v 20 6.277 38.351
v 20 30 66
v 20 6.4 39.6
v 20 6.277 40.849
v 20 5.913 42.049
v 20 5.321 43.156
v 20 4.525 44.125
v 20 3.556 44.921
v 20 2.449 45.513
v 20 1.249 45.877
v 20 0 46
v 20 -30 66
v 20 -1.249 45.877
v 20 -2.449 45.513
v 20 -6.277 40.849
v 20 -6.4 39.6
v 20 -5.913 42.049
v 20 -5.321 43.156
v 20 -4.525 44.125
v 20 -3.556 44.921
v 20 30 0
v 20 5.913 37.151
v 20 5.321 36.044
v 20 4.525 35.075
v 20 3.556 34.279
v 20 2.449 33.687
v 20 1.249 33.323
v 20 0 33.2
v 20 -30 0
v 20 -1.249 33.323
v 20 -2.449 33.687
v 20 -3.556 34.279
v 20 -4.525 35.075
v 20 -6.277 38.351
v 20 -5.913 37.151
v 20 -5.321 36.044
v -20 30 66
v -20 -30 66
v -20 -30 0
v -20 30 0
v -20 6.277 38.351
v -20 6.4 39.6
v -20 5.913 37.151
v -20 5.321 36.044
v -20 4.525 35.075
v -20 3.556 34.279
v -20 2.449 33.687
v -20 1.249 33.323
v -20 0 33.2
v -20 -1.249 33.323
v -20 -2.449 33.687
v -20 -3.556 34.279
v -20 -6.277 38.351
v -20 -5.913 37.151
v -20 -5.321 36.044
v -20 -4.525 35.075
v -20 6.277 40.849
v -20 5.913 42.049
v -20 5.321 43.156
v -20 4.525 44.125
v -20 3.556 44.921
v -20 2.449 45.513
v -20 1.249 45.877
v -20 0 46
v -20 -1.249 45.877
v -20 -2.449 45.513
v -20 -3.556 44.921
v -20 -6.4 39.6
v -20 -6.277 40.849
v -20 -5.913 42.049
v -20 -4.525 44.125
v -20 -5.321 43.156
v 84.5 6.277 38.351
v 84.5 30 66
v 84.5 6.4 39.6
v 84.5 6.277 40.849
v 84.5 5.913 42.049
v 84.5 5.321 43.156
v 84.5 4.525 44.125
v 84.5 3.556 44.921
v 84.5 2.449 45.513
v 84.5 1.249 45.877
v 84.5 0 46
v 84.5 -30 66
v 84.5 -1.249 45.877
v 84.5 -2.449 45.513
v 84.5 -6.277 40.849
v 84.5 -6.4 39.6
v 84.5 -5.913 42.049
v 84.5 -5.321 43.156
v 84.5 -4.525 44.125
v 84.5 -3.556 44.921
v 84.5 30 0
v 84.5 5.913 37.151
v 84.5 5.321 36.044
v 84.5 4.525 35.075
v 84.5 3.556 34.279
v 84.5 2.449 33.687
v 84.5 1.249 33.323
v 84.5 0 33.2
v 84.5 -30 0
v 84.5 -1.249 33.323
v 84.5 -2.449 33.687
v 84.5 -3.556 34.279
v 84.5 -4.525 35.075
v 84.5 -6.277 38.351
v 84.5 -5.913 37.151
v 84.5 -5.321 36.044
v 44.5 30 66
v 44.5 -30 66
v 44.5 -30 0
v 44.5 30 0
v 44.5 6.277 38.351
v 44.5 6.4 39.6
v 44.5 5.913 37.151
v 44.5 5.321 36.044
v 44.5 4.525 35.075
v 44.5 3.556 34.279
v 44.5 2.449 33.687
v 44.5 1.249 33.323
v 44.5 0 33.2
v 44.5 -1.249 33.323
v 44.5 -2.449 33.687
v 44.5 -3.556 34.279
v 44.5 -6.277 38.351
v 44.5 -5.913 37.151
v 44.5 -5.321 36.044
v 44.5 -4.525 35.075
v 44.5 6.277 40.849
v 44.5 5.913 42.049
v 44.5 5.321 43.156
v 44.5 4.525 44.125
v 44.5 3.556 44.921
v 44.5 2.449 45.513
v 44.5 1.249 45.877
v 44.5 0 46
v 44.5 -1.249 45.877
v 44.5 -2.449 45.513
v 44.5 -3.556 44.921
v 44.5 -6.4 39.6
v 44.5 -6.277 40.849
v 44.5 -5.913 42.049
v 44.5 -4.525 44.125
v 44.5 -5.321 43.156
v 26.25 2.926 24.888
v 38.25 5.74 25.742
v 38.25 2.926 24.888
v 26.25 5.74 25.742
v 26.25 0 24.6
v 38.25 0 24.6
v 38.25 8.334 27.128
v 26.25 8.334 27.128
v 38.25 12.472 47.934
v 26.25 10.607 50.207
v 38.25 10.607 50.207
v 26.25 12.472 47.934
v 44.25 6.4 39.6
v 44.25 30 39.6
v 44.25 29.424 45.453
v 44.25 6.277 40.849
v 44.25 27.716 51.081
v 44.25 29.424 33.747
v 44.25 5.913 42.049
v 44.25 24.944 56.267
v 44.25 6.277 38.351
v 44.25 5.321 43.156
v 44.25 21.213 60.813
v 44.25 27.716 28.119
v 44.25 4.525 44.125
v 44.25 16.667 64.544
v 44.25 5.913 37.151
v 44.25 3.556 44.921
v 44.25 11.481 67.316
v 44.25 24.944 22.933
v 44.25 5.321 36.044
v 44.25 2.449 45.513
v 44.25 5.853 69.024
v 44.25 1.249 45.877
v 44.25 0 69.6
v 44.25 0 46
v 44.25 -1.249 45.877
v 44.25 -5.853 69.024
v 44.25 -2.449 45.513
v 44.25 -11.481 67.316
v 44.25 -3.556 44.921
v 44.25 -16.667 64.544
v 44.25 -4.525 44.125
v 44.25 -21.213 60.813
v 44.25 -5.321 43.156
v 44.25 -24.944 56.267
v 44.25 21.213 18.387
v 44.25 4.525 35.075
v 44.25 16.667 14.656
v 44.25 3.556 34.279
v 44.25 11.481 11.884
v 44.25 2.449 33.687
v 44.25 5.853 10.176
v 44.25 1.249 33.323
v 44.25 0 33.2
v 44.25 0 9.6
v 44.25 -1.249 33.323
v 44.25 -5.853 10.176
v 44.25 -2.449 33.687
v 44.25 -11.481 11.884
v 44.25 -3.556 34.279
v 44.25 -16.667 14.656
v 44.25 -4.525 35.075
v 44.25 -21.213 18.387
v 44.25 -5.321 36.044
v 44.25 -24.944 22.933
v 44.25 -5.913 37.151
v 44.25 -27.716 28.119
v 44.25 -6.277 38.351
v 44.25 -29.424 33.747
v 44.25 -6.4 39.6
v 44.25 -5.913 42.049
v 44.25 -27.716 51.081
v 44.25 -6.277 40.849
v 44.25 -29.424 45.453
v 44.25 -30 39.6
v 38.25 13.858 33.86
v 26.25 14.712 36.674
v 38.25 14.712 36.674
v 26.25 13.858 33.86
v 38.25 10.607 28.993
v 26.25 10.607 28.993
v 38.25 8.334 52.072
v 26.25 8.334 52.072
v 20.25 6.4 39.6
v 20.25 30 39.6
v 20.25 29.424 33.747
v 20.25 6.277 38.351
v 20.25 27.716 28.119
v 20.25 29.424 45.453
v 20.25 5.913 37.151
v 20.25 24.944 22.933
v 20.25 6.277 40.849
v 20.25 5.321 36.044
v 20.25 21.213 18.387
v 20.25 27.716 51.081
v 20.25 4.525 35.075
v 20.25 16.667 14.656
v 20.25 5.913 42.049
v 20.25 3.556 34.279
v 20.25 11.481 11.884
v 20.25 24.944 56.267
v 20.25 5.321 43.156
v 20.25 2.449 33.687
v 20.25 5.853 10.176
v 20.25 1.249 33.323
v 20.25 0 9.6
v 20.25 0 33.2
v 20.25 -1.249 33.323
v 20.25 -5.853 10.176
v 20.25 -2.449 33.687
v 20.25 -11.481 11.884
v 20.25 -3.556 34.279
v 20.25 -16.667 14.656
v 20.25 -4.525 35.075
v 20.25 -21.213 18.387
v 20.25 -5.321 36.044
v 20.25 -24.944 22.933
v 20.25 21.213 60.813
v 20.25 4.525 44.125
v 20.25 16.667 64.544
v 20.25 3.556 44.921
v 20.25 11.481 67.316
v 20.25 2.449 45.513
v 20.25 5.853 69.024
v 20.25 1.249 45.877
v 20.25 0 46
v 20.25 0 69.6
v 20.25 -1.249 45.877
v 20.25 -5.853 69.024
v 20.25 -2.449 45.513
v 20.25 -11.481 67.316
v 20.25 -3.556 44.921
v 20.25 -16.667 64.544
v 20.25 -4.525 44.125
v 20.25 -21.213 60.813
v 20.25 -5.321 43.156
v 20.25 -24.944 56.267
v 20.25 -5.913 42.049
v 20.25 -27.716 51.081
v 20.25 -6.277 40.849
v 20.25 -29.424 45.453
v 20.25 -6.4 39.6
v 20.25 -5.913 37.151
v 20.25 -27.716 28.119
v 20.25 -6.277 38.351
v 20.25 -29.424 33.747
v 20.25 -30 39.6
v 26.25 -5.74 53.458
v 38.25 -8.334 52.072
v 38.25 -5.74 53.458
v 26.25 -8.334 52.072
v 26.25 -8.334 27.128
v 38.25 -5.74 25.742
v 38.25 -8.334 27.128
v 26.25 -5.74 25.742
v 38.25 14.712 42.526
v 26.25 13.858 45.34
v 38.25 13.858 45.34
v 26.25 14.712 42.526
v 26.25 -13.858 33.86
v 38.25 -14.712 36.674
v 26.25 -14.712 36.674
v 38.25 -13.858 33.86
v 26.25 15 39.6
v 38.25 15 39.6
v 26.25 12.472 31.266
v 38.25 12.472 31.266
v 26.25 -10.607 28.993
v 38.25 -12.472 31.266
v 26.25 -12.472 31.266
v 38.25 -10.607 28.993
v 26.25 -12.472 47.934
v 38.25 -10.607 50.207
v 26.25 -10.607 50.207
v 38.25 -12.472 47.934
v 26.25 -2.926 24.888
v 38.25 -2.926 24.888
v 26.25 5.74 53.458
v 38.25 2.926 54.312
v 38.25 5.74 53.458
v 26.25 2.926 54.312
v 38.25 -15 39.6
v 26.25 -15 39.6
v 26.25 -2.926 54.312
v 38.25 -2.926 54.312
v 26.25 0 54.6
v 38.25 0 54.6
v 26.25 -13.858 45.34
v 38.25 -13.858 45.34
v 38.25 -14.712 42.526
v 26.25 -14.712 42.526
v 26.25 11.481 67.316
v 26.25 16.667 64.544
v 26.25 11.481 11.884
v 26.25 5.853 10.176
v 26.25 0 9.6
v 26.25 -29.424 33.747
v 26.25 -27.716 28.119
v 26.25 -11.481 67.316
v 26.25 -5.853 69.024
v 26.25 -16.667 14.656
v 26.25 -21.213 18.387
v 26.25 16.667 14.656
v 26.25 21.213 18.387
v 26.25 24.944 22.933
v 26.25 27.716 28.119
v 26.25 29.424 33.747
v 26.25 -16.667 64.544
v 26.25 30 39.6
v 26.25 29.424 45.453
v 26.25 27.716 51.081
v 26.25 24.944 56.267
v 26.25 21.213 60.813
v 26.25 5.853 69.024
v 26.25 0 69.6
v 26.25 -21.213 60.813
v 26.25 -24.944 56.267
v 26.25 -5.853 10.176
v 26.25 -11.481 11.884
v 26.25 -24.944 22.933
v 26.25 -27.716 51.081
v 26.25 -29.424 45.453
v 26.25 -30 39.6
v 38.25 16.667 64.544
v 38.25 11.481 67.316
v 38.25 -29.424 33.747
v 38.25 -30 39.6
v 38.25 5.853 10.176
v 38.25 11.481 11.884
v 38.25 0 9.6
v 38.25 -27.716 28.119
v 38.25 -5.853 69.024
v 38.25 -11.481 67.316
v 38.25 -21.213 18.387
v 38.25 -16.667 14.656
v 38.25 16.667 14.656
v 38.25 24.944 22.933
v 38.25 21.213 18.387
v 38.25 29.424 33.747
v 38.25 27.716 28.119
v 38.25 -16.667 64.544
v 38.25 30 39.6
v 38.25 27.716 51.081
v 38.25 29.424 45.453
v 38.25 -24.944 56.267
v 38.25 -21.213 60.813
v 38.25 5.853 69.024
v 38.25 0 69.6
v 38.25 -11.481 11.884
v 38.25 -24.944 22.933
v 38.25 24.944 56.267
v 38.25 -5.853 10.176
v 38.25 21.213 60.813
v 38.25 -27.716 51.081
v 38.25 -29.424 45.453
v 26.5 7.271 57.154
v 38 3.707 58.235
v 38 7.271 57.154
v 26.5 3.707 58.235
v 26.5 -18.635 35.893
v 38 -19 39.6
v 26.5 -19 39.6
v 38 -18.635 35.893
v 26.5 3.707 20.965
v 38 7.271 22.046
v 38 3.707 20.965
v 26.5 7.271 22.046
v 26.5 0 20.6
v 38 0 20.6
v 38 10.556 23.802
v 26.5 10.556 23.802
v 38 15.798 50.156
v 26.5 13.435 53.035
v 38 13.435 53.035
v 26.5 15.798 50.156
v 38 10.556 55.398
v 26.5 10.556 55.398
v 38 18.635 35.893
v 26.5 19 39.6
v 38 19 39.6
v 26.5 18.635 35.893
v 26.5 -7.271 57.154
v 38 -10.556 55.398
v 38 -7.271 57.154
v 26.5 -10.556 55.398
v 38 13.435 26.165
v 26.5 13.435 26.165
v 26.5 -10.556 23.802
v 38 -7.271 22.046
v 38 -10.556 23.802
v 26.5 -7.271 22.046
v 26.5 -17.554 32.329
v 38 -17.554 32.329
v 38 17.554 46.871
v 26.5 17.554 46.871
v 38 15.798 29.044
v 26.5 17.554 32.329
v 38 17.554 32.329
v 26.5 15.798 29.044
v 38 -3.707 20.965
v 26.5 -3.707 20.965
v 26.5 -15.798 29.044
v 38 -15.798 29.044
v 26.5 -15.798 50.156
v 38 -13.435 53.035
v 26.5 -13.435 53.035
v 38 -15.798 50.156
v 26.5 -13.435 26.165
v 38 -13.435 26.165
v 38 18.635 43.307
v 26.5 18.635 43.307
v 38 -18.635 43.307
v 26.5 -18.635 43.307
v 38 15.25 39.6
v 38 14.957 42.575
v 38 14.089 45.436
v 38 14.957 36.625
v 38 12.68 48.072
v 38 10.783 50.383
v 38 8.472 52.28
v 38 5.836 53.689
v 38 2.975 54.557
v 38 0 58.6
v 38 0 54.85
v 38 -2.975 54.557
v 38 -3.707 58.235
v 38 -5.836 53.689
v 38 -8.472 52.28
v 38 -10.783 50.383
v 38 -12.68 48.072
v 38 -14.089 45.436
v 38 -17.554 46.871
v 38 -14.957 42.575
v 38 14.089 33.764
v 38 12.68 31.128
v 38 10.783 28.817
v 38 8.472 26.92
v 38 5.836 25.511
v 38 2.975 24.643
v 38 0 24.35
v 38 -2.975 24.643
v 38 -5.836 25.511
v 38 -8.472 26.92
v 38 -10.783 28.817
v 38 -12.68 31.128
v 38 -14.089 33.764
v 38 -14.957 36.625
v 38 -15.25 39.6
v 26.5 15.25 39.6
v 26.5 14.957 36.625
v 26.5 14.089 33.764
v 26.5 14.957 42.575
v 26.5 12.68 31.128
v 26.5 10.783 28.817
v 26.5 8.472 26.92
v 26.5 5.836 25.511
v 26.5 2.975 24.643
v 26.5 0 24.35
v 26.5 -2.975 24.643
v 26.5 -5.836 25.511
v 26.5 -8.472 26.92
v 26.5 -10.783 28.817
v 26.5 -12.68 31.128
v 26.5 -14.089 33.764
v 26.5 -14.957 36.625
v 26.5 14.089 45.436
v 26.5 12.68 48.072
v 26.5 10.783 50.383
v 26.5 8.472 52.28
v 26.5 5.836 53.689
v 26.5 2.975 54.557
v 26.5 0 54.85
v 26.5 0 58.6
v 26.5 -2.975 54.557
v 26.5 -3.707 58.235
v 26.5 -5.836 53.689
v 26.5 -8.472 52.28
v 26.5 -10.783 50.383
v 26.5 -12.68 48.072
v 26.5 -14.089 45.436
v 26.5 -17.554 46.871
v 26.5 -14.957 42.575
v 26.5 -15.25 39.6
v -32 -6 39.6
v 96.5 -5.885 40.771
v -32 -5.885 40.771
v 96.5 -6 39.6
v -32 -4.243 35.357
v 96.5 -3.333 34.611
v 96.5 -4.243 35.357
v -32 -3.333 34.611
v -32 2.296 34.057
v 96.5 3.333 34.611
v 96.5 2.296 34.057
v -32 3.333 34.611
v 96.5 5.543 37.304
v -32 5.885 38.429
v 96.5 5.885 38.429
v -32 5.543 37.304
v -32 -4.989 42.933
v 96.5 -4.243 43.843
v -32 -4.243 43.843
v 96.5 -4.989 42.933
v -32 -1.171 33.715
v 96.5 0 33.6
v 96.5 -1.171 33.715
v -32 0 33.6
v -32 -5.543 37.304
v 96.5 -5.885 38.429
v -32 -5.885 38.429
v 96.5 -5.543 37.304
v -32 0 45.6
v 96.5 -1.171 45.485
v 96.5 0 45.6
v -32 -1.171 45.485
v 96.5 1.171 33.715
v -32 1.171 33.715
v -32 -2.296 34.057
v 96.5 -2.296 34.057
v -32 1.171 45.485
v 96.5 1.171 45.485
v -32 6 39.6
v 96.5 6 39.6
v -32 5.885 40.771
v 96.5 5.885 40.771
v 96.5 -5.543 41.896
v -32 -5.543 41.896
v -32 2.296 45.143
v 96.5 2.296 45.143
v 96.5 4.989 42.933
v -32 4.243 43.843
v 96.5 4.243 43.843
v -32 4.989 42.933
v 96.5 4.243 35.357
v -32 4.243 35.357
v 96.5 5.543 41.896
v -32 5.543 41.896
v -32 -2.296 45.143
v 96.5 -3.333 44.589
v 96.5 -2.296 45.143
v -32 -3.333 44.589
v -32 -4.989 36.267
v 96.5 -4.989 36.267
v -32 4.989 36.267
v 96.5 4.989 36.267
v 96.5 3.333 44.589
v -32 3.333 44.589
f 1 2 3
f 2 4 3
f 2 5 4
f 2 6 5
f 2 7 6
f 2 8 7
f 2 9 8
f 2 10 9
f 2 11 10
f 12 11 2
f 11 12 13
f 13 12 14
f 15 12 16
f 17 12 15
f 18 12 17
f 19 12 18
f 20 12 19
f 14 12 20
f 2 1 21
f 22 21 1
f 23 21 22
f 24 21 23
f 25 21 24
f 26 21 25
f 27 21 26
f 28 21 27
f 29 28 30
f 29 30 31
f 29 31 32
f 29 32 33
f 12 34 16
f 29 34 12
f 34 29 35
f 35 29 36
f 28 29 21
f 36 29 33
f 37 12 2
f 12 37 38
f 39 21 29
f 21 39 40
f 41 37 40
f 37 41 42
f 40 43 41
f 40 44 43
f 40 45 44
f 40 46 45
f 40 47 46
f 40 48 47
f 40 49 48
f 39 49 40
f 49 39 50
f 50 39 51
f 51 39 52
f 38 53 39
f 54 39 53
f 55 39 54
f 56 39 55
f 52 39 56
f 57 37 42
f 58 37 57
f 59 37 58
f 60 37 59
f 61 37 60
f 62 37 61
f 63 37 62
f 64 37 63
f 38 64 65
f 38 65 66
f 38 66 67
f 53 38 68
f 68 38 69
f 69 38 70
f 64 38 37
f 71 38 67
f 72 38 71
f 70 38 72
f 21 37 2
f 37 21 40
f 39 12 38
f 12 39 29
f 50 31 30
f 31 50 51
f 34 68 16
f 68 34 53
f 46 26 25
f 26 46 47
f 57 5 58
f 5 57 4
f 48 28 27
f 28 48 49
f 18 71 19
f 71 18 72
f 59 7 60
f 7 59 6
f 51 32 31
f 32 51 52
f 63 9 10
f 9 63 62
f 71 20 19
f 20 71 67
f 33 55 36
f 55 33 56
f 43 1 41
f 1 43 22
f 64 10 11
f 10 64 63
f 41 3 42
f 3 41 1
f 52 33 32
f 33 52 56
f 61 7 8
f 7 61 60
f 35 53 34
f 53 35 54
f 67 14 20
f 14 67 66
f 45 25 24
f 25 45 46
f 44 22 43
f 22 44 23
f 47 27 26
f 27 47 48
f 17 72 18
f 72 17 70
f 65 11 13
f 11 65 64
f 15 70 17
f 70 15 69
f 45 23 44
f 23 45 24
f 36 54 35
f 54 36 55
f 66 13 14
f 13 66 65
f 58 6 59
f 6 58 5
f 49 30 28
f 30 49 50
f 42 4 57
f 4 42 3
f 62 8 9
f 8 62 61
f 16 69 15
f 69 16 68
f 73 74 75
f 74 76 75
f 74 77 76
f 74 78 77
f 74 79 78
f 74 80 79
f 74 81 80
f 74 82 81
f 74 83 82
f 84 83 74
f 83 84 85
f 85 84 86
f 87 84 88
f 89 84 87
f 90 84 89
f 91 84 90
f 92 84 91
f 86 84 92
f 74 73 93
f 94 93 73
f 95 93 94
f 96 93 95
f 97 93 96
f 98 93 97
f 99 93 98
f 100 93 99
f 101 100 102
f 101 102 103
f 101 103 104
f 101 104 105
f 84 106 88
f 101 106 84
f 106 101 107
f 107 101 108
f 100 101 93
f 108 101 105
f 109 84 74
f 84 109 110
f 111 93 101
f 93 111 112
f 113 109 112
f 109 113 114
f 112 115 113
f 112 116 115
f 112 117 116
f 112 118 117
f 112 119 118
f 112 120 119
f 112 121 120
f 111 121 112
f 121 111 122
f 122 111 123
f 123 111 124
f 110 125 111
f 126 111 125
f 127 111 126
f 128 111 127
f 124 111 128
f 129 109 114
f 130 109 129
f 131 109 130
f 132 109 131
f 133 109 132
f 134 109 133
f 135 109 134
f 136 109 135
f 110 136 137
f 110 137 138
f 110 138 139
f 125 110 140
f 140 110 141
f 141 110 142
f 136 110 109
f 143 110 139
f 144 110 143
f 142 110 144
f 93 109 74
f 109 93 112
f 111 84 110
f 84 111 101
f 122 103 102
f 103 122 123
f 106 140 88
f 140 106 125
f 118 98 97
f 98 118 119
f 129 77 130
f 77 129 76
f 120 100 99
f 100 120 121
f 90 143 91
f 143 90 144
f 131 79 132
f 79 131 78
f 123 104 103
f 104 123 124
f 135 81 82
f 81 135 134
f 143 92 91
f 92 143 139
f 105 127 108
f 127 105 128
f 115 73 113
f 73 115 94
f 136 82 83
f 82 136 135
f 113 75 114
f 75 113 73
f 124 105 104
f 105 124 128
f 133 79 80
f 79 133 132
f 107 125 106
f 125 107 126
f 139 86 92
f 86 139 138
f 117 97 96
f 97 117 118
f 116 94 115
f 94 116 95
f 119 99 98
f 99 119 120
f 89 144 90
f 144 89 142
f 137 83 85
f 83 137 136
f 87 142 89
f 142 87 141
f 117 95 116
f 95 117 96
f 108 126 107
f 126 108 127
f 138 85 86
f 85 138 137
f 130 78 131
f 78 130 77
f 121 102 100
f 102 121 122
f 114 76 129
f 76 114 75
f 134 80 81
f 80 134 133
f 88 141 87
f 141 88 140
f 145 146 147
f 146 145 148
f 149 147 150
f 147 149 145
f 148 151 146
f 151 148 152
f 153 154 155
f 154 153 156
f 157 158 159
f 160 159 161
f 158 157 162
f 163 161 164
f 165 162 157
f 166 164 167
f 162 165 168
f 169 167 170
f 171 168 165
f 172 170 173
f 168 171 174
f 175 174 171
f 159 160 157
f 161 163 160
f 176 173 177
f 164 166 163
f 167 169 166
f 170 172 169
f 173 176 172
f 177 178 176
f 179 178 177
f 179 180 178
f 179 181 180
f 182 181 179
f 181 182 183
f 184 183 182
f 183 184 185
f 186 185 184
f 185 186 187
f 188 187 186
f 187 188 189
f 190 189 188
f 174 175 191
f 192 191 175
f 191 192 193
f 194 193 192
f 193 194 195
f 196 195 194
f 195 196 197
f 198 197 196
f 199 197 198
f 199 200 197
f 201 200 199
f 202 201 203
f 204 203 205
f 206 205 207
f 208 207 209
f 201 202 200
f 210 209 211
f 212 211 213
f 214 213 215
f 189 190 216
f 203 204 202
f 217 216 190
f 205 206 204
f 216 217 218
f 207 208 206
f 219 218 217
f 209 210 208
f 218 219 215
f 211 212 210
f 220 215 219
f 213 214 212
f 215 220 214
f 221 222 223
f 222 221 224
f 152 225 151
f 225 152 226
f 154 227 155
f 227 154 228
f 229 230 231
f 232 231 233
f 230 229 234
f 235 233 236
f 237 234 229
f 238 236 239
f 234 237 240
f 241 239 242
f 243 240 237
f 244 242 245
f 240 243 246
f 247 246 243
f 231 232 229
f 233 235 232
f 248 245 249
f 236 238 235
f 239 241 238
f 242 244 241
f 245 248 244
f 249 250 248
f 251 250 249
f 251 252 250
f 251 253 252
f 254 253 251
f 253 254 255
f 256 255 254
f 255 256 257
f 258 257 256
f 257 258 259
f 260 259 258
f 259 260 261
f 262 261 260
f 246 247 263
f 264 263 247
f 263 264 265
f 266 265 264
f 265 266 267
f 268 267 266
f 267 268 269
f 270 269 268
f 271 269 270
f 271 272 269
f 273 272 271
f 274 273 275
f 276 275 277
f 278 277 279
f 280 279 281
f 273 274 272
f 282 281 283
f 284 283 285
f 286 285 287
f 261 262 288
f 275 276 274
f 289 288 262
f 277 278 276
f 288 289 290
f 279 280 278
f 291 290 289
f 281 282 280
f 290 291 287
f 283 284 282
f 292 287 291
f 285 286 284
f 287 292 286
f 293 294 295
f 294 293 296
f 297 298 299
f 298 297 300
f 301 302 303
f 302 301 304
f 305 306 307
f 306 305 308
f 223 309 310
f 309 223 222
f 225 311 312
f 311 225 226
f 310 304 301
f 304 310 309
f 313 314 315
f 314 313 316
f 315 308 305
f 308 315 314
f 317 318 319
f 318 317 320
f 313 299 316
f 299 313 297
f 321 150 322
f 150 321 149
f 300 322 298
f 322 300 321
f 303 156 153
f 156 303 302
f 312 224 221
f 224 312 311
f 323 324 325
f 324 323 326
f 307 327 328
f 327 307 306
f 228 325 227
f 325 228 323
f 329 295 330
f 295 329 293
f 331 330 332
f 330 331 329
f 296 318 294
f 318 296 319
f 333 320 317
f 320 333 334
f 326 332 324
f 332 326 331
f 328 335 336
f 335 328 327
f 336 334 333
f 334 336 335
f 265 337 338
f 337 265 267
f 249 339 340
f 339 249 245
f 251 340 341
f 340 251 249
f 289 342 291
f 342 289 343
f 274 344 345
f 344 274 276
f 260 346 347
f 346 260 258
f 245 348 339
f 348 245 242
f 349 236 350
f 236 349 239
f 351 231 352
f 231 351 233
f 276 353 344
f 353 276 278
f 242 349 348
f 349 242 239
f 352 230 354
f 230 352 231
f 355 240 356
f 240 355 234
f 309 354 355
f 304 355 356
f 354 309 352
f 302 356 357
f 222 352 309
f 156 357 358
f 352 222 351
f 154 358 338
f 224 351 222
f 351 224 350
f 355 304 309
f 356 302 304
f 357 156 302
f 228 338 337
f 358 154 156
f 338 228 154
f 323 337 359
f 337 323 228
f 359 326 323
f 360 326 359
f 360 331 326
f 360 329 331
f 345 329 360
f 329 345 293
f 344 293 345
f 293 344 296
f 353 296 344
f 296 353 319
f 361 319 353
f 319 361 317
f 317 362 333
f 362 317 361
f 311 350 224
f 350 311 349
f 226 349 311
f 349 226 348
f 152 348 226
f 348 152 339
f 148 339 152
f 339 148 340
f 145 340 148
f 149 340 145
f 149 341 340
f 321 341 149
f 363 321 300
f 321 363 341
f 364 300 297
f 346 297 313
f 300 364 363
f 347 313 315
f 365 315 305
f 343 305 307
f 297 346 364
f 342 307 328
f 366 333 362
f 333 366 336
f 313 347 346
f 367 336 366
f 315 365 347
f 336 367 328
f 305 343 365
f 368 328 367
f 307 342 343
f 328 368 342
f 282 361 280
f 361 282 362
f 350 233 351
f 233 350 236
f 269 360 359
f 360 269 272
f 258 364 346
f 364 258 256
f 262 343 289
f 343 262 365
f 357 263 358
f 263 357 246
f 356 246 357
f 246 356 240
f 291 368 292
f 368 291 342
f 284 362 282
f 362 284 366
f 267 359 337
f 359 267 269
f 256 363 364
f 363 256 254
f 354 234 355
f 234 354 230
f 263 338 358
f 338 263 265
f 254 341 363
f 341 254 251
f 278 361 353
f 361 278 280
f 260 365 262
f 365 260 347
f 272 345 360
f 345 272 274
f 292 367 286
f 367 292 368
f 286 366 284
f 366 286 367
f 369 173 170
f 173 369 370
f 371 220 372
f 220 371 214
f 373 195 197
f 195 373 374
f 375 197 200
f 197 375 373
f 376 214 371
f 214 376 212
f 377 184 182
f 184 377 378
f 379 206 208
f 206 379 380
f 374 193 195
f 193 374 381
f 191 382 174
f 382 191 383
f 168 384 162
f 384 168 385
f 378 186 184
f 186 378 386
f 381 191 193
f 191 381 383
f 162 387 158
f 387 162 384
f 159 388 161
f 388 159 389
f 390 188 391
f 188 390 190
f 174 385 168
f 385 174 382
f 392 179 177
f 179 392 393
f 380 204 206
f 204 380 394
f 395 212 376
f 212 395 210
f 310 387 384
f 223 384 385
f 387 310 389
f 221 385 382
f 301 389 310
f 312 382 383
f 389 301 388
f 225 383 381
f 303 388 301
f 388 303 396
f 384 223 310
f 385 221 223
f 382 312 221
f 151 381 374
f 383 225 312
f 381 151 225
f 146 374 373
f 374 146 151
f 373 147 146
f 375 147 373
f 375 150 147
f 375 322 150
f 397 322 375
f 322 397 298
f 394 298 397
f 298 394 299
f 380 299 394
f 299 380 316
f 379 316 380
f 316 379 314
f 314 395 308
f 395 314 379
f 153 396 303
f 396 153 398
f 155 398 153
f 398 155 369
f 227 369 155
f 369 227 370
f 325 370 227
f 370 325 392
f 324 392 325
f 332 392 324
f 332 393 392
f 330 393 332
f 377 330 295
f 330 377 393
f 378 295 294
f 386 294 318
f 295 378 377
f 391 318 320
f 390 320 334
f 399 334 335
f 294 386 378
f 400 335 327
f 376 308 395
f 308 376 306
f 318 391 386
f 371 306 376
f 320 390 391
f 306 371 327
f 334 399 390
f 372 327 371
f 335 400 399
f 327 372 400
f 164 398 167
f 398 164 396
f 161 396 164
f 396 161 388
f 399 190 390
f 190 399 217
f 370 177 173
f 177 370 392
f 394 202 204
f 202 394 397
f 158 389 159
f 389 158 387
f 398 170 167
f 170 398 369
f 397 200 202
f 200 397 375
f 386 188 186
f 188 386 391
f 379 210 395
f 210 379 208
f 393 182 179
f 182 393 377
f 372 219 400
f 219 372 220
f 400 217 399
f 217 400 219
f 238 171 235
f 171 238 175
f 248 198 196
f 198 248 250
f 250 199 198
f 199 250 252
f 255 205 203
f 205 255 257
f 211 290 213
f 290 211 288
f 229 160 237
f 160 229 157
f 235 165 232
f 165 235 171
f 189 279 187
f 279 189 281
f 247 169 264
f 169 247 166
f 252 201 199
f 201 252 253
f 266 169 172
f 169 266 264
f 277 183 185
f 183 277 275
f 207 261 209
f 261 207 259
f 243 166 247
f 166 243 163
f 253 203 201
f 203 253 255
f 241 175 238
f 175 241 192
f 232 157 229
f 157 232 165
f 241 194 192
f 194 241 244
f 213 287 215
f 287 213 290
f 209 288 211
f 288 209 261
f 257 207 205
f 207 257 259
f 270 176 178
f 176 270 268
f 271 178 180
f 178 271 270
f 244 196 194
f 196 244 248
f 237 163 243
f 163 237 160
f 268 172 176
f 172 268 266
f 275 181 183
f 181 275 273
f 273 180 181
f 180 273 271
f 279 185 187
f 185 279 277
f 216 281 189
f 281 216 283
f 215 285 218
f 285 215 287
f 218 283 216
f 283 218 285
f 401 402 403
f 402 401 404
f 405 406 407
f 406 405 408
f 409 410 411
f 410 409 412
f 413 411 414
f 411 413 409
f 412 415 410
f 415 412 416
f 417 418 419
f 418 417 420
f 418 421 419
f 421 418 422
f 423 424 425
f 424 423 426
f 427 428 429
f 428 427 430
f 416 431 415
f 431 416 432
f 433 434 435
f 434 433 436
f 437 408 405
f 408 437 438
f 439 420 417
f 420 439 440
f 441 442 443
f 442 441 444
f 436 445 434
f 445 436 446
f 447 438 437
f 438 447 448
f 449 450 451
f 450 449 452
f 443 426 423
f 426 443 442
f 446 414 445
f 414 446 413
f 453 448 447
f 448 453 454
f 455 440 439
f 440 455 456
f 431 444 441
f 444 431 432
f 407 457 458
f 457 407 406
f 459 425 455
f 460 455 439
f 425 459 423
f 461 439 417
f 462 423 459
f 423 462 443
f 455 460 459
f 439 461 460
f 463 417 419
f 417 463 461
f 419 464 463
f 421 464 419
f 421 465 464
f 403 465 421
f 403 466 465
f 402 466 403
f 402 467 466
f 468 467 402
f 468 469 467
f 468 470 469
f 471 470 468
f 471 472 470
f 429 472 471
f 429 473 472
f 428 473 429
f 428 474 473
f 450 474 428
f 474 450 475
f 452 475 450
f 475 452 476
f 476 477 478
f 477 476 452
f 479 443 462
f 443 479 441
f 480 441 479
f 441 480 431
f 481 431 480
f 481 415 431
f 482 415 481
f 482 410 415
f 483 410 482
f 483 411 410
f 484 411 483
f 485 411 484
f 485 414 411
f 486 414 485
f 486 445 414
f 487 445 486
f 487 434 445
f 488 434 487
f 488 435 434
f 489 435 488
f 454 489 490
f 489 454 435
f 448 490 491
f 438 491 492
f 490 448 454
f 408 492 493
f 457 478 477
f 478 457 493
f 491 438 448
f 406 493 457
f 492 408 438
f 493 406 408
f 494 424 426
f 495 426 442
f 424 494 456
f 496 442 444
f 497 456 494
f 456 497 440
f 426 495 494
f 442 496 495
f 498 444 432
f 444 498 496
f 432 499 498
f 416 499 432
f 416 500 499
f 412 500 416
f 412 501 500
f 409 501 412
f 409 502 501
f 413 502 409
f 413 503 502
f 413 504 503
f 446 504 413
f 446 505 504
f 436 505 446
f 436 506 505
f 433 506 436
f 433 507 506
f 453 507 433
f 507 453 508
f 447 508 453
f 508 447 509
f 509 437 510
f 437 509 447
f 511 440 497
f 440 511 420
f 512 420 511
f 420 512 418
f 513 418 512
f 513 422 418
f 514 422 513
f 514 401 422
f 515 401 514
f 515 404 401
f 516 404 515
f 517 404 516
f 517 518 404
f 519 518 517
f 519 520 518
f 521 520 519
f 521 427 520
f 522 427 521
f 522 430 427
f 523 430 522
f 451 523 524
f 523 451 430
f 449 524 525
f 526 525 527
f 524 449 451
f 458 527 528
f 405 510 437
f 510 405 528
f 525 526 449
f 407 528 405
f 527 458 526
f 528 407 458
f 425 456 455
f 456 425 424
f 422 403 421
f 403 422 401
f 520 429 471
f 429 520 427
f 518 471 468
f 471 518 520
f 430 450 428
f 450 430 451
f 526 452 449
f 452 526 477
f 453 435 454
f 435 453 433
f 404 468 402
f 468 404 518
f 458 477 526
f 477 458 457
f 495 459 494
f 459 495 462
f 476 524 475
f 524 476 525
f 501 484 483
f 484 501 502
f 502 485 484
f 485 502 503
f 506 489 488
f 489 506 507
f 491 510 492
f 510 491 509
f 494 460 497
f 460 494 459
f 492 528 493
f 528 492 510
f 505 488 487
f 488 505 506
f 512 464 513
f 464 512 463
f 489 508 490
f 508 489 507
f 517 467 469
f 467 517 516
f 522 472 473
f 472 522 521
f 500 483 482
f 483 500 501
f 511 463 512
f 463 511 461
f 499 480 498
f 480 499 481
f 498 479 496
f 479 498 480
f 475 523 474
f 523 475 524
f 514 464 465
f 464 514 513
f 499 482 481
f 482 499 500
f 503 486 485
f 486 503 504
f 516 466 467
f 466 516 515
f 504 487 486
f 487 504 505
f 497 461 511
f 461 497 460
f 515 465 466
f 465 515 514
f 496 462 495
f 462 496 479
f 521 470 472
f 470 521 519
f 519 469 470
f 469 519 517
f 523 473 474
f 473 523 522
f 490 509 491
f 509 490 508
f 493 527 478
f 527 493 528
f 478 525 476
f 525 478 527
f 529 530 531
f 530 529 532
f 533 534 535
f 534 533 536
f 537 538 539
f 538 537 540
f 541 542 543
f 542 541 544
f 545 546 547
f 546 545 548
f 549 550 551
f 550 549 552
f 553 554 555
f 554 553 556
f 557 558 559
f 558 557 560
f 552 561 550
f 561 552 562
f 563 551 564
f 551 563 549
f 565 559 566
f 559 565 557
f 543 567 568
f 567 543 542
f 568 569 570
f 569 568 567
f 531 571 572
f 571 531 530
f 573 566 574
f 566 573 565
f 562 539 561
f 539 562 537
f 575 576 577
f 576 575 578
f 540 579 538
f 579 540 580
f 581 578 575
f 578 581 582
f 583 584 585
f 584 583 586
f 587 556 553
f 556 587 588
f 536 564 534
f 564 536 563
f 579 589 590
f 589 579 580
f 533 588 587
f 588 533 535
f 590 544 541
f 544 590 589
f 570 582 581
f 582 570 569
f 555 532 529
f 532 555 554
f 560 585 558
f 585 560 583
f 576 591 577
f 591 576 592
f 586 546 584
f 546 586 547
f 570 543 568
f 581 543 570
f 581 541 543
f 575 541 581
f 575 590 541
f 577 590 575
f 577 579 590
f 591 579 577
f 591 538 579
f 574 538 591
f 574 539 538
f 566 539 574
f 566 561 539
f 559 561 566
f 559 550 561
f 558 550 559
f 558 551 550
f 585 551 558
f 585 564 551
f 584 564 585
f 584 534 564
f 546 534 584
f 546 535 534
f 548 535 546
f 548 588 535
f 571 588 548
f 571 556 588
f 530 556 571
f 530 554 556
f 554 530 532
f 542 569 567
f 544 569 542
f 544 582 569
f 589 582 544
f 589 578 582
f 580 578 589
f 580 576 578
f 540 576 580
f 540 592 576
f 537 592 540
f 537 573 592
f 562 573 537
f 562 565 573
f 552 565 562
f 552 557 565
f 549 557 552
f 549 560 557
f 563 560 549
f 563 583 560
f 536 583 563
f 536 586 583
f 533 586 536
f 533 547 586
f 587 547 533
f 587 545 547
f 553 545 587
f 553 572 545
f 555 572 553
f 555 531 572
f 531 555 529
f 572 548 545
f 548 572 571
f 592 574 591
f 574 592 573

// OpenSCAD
$fn = 32;

// ------------------------------------------------------------------------
// Pulley assembly: d60 pulley with a belt, shaft d12
// Every part is its own module, assembly() places them once.
// ------------------------------------------------------------------------

// --- part 1 ---
module support1() {
  difference() {
    translate([-20, -30, 0]) cube([40, 60, 66]);
    translate([0, 0, 39.6]) rotate([0, 90, 0]) cylinder(h = 42, d = 12.8, center = true);
  }
}

// --- part 2 ---
module support2() {
  difference() {
    translate([-20, -30, 0]) cube([40, 60, 66]);
    translate([0, 0, 39.6]) rotate([0, 90, 0]) cylinder(h = 42, d = 12.8, center = true);
  }
}

// --- part 3 ---
module shaft() {
  translate([0, 0, -64.25]) cylinder(h = 128.5, d = 12);
}

// --- part 4 ---
module pulley() {
  difference() {
    union() {
      cylinder(h = 24, d = 30);
      cylinder(h = 6, d = 60);
      translate([0, 0, 18]) cylinder(h = 6, d = 60);
    }
    translate([0, 0, -1]) cylinder(h = 26, d = 12.8);
  }
}

// --- part 5 ---
module belt() {
  difference() {
      translate([0, 0, 0]) cylinder(h = 11.5, d = 38);
      translate([0, 0, -1]) cylinder(h = 13.5, d = 30.5);
    }
}

// --- assembly ---
module assembly() {
  translate([0, 0, 0]) rotate([0, 0, 0]) support1();
  translate([64.5, 0, 0]) rotate([0, 0, 0]) support2();
  translate([32.25, 0, 39.6]) rotate([0, 90, 0]) shaft();
  translate([20.25, 0, 39.6]) rotate([0, 90, 0]) pulley();
  translate([26.5, 0, 39.6]) rotate([0, 90, 0]) belt();
}

assembly();
